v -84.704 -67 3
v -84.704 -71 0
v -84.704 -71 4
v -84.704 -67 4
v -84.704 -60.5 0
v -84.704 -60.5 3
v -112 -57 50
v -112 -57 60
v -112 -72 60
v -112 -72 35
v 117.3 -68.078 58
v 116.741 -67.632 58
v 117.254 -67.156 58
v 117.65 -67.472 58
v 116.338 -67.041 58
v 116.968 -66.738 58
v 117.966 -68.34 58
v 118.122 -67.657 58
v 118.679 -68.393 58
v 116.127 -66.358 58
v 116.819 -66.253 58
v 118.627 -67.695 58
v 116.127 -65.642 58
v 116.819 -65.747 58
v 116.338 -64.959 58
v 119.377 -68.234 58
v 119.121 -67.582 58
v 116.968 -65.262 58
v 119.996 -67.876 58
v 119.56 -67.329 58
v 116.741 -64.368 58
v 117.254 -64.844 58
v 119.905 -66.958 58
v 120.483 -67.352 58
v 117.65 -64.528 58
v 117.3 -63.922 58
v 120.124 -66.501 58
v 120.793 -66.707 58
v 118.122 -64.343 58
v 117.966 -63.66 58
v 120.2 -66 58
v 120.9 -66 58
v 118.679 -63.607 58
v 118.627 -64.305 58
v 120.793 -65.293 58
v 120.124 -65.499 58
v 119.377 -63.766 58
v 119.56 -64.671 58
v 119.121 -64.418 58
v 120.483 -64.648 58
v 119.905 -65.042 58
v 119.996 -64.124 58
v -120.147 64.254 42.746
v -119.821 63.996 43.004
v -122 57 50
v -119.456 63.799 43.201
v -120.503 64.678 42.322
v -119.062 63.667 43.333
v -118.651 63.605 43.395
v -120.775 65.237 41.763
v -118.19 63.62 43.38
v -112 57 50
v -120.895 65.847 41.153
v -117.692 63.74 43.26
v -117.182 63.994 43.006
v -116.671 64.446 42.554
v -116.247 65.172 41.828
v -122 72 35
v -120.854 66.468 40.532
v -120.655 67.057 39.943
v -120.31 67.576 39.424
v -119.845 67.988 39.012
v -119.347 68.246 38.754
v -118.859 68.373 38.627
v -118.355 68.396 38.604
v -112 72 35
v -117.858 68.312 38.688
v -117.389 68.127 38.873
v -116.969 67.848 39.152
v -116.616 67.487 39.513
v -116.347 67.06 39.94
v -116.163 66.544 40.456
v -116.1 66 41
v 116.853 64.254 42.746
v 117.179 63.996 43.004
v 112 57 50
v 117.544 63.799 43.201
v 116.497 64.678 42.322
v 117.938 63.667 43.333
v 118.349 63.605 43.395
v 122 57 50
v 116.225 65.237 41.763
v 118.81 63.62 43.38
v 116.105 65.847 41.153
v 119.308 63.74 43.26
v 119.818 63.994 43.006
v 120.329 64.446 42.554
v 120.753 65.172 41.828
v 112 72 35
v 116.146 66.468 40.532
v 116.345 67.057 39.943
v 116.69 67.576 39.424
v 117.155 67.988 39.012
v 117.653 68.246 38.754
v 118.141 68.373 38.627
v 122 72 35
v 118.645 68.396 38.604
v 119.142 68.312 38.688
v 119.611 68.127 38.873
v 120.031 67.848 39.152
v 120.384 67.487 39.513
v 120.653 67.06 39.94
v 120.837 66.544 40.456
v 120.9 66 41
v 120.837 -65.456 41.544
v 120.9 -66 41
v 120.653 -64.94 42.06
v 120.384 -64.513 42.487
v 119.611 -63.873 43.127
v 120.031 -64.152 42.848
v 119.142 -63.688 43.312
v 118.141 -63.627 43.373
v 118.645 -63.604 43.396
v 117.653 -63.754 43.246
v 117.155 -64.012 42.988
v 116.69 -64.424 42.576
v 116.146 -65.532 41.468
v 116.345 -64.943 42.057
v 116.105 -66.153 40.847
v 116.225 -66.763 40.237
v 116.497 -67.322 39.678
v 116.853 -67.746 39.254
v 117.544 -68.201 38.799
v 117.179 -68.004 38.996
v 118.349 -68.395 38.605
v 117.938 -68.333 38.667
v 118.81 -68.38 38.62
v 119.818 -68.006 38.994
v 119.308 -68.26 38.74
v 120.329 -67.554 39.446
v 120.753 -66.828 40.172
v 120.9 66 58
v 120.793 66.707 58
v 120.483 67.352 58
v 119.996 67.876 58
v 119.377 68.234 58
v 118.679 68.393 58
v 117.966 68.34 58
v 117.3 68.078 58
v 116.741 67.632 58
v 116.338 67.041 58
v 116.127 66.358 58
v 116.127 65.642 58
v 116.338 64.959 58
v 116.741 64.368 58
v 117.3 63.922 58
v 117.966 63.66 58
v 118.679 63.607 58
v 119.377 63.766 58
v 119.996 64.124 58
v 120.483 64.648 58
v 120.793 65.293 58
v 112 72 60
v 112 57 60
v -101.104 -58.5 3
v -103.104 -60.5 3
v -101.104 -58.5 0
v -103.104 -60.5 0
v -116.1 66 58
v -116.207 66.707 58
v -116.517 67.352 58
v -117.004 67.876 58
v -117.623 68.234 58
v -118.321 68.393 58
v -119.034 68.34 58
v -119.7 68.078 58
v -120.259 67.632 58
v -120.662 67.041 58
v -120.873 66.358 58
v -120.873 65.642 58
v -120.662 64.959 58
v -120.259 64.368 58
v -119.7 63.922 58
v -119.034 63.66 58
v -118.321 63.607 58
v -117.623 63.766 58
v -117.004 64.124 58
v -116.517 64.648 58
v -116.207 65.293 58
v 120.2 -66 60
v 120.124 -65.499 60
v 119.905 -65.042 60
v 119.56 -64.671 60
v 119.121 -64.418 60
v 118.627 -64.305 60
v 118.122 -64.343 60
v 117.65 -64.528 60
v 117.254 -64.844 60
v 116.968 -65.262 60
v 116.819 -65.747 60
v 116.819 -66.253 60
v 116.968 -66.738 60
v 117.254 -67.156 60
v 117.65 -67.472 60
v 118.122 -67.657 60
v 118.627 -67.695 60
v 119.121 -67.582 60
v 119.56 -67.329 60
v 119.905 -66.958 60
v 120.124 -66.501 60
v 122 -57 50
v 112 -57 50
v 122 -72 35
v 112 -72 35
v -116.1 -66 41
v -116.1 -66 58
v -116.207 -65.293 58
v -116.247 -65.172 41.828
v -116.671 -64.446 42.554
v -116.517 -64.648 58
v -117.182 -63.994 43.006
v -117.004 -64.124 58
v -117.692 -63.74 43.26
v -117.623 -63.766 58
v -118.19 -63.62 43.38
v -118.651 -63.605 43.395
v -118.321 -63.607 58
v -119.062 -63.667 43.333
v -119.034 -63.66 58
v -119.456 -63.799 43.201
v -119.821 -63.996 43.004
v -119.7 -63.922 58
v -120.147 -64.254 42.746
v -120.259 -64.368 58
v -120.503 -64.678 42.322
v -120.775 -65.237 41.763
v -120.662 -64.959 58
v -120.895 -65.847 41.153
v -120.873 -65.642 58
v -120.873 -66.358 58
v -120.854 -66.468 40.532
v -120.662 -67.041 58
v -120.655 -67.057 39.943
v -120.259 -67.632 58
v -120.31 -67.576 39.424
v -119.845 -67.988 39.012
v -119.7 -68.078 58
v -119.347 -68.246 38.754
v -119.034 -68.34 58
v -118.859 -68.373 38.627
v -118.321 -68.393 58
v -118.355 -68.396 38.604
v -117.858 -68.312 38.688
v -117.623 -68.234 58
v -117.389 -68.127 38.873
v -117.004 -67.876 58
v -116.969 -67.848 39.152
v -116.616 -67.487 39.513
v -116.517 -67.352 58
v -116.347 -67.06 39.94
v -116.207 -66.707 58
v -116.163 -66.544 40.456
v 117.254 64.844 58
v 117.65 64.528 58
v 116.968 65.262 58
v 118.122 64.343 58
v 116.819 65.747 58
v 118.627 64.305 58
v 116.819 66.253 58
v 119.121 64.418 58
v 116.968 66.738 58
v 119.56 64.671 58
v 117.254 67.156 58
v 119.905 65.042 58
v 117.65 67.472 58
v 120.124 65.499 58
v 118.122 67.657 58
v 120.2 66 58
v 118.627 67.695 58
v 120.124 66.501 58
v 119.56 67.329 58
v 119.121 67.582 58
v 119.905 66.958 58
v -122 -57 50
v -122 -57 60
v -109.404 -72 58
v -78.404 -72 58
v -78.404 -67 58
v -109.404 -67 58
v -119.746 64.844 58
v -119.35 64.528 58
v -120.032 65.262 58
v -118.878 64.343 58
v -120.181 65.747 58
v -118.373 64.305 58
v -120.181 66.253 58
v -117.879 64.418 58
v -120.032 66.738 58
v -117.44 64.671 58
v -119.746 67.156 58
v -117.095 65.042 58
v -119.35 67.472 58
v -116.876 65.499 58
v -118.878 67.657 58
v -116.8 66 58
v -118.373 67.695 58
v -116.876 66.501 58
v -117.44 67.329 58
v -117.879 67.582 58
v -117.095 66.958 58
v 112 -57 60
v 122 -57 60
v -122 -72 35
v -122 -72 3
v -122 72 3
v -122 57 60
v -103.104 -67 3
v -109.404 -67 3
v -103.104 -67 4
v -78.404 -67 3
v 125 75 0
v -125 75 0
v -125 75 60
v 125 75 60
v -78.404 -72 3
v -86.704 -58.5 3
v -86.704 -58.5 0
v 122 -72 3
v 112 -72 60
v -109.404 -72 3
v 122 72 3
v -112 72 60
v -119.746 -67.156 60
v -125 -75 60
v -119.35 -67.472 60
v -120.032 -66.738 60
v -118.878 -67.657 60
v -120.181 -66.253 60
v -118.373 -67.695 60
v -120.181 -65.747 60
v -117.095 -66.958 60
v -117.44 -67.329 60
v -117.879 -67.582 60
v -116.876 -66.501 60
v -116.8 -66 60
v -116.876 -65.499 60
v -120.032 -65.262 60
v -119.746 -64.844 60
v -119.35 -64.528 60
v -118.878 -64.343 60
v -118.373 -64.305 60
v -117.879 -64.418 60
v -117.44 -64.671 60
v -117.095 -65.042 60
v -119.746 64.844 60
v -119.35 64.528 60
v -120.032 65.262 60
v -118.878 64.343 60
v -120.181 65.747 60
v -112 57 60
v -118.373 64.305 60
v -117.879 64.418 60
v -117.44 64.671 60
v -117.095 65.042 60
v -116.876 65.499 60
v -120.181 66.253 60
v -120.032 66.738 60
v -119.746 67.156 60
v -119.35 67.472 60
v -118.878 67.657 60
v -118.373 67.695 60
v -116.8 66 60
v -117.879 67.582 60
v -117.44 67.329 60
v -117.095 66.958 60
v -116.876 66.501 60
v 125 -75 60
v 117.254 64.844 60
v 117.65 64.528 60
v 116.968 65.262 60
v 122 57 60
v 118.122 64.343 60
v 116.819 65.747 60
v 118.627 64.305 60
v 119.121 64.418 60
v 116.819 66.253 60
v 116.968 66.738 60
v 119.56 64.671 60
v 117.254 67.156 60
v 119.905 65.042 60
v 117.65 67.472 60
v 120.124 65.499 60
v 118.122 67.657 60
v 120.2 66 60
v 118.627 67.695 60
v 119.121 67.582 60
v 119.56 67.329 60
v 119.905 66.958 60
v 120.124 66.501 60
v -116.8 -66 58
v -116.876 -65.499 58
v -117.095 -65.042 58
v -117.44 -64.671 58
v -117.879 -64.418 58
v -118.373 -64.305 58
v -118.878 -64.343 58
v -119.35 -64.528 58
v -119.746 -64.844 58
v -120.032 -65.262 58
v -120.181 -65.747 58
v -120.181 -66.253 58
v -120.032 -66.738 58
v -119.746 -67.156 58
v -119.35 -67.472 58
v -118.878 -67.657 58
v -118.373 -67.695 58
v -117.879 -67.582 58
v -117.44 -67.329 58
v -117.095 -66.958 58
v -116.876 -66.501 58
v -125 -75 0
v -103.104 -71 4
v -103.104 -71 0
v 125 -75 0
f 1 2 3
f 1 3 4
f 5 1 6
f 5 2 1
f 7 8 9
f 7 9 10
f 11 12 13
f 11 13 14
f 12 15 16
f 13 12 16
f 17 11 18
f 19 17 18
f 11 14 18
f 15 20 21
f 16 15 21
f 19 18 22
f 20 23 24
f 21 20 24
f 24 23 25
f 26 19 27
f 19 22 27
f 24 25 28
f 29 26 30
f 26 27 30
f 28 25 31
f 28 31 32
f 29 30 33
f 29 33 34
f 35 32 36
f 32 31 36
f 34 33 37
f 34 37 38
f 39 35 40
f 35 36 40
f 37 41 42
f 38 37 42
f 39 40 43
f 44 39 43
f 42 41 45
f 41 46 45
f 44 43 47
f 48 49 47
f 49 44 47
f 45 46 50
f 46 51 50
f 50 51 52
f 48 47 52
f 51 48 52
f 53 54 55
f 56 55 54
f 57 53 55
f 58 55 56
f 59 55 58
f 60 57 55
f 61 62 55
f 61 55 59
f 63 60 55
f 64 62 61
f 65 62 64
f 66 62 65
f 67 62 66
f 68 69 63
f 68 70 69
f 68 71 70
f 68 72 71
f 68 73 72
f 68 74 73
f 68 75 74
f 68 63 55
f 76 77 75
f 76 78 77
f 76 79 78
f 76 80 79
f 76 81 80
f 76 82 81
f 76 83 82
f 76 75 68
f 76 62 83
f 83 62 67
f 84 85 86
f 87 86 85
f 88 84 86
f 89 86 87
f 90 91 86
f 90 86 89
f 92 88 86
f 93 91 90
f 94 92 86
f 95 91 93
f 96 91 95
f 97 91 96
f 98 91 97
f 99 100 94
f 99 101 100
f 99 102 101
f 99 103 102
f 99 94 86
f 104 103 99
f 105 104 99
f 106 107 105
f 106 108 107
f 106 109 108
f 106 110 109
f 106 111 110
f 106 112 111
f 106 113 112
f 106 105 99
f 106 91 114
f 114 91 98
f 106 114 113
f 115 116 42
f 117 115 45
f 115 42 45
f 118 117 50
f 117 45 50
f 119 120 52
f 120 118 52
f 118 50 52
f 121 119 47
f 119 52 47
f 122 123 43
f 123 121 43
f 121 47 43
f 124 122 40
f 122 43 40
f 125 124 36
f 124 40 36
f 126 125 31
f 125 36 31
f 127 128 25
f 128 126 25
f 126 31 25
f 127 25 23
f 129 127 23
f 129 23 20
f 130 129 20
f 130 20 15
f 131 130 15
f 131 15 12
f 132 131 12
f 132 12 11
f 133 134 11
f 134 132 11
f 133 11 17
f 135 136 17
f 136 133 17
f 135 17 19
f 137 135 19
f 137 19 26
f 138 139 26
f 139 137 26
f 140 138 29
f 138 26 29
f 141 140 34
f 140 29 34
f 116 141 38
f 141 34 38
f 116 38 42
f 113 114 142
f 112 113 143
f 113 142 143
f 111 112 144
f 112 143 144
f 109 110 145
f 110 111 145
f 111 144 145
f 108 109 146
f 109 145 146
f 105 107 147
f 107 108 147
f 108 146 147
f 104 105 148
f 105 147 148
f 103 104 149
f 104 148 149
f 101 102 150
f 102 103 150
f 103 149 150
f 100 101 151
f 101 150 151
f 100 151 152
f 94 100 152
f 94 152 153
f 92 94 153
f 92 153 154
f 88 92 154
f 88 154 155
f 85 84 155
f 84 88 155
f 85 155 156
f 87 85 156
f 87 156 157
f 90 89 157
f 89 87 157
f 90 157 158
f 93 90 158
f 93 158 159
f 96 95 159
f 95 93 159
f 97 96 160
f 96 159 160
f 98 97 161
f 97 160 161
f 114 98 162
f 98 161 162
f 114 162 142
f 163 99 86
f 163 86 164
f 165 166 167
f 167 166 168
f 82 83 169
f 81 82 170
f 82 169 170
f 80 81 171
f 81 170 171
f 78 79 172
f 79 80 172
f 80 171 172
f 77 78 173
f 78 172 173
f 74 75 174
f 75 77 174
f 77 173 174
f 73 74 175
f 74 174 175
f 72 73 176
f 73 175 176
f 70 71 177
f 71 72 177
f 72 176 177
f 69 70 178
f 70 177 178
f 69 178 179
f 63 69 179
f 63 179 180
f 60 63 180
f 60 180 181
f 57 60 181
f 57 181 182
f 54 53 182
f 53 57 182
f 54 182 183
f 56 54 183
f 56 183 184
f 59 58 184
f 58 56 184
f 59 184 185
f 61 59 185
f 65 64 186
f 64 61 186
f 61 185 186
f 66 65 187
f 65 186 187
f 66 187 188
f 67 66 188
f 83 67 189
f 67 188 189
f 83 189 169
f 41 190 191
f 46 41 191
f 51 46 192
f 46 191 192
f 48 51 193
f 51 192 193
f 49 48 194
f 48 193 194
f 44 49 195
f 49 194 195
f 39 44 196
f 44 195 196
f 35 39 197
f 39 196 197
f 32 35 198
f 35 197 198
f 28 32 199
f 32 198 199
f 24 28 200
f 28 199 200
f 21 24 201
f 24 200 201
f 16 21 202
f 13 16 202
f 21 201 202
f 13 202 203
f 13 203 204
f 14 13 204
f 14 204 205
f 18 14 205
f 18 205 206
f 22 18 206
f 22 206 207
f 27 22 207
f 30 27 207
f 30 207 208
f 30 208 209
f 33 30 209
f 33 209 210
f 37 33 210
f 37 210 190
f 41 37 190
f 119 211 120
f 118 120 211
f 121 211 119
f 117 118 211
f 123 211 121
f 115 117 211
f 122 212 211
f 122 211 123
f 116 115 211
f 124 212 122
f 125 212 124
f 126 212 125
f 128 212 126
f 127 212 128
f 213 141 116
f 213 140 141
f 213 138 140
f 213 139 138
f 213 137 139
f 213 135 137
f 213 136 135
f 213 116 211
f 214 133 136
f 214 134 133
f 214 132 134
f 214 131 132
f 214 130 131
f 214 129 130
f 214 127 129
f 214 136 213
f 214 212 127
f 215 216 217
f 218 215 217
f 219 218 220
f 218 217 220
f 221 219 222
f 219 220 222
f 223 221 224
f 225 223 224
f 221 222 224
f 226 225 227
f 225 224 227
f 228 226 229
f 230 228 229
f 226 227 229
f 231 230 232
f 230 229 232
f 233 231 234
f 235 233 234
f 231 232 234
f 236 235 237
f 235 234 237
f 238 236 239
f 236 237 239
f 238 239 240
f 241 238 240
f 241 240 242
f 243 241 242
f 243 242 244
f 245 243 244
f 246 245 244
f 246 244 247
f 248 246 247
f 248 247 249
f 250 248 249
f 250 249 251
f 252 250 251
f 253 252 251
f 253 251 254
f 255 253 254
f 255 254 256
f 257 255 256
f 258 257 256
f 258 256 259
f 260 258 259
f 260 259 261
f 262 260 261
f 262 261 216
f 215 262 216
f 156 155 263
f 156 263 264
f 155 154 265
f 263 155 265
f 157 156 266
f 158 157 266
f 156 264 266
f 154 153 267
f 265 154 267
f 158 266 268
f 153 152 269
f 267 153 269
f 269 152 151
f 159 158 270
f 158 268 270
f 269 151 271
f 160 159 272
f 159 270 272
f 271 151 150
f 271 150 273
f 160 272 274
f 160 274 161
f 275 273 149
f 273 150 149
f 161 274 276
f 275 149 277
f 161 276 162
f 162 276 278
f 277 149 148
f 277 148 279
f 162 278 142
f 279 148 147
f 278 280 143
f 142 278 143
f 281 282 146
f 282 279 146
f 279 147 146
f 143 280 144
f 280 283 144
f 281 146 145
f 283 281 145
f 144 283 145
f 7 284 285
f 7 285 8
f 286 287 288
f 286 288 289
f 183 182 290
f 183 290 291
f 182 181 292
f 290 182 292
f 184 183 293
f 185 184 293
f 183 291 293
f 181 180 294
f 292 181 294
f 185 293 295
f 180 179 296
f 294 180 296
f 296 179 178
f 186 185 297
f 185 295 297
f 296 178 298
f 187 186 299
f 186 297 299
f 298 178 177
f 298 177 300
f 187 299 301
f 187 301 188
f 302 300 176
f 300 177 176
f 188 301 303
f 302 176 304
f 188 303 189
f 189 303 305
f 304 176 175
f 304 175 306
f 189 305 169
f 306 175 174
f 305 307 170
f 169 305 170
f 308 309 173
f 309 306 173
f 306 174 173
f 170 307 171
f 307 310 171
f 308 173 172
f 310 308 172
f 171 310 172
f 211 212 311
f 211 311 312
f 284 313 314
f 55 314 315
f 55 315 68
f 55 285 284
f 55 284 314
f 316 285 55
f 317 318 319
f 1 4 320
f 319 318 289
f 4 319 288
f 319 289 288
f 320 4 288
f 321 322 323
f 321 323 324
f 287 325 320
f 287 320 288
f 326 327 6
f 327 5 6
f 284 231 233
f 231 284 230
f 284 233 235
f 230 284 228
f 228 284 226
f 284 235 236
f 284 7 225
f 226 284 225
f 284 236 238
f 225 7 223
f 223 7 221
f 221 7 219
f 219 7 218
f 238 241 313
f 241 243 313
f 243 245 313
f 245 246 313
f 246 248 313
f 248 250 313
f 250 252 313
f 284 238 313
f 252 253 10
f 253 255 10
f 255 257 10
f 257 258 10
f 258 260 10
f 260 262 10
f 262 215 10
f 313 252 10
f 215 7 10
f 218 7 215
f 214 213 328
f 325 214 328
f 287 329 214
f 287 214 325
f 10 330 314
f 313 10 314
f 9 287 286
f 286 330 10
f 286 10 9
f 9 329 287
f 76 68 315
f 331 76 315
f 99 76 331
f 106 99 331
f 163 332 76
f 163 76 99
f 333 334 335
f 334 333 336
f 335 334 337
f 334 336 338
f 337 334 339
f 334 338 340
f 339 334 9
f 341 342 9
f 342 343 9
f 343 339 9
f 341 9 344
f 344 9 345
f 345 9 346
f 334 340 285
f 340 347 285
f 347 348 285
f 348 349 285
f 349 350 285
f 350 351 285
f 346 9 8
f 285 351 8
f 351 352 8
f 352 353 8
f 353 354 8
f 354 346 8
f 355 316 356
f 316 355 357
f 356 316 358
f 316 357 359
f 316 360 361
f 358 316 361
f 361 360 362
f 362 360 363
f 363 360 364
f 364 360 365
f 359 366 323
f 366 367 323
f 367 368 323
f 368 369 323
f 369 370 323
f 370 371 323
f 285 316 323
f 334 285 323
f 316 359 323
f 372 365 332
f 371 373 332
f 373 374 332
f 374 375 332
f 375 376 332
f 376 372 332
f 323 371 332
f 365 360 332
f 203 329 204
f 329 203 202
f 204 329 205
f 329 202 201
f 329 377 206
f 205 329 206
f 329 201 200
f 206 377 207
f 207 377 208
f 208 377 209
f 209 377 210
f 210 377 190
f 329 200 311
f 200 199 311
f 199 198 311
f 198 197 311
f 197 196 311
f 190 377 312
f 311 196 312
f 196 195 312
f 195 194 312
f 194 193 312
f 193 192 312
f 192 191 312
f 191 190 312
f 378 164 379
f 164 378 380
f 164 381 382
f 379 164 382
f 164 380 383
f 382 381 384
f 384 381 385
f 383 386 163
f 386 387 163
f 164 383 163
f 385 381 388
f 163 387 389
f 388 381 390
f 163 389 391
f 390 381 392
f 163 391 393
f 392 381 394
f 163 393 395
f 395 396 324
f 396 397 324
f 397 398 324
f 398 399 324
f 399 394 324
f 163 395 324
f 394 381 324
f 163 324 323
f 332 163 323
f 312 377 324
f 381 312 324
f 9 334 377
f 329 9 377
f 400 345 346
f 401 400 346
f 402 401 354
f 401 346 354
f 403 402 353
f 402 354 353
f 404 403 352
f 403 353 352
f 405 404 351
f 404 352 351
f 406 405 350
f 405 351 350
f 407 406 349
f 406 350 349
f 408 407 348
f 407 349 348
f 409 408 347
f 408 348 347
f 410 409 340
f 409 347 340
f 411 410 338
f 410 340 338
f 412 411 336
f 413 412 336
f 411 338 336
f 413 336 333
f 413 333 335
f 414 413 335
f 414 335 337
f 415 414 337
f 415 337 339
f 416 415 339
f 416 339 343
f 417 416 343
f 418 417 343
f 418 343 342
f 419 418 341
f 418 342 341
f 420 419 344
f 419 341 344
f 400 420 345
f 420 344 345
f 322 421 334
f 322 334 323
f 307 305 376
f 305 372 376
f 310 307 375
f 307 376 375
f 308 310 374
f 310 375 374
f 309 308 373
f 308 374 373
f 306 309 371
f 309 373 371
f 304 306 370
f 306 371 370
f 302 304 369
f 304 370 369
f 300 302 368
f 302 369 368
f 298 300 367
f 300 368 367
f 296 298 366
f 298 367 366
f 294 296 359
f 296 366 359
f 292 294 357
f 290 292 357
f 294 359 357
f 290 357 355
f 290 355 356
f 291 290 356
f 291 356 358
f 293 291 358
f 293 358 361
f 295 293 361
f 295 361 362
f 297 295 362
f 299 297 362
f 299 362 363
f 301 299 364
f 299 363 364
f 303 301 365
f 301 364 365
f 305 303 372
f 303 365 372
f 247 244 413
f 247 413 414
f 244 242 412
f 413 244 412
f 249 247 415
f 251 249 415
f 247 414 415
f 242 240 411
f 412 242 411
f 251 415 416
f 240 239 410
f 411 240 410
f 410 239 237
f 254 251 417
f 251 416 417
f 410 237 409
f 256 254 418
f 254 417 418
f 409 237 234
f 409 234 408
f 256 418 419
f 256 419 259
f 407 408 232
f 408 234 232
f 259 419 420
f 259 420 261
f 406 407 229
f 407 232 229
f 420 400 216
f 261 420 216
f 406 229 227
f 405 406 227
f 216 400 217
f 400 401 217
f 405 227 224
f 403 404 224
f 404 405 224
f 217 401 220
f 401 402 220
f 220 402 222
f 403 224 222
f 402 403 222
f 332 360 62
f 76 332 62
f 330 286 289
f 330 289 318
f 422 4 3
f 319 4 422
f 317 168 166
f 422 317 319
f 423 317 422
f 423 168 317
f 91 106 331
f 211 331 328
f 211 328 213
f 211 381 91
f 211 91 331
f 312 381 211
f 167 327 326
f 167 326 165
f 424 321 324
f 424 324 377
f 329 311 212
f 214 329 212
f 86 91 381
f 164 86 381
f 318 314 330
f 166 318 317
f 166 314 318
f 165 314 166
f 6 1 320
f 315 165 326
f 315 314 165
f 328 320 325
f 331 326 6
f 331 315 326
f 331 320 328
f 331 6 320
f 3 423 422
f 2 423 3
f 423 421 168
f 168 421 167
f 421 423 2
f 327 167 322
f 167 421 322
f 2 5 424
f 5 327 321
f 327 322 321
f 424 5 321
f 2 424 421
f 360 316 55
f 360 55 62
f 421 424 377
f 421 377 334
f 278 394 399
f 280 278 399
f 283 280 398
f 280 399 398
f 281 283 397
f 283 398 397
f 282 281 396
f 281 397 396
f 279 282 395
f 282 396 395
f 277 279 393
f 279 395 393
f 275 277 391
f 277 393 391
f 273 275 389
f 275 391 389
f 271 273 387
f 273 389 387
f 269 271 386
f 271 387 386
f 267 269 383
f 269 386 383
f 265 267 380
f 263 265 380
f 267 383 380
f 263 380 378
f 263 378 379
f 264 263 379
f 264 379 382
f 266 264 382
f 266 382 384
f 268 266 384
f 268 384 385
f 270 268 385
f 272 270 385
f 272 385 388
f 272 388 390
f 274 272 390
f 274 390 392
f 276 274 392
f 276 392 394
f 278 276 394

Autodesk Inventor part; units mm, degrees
ref_plane "YZ Plane" through (0, 0, 0) normal (1, 0, 0) x (0, 1, 0)
ref_plane "XZ Plane" through (0, 0, 0) normal (0, 1, 0) x (-1, 0, 0)
ref_plane "XY Plane" through (0, 0, 0) normal (0, 0, 1) x (1, 0, 0)
sketch "Sketch7" plane through (0, 0, 0) normal (0, 0, 1) x (1, 0, 0)
  line L0 (125, -75) -> (-125, -75)
  line L1 (-125, -75) -> (-125, 75)
  line L2 (-125, 75) -> (125, 75)
  line L3 (125, 75) -> (125, -75)
  line L4 (125, -75) -> (-125, 75) construction
  line L5 (-125, -75) -> (125, 75) construction
  point P0 (0, 0)
  dimension "d15" = 250
  dimension "d16" = 150
extrude "Box Outside" add sketch "Sketch7" along normal blind 60
sketch "Sketch8" plane through (0, 0, 60) normal (0, 0, 1) x (1, 0, 0)
  line L0 (-122, 72) -> (122, 72)
  line L1 (122, 72) -> (122, -72)
  line L2 (122, -72) -> (-122, -72)
  line L3 (-122, -72) -> (-122, 72)
  line L4 (125, 75) -> (-125, 75) projected
  line L5 (-125, 75) -> (-125, -75) projected
  line L6 (-125, -75) -> (125, -75) projected
  line L7 (125, -75) -> (125, 75) projected
  point P0 (0, 0)
  dimension "d19" = 3
  dimension "d20" = 3
  dimension "d21" = 3
  dimension "d22" = 3
extrude "Box Cut" cut sketch "Sketch8" against normal blind 57 contours L0 L1 L2 L3
sketch "Sketch9" plane through (-122, -72, 60) normal (0, 1, 0) x (1, 0, 0)
  line L0 (0, 0) -> (10, 0)
  line L1 (10, 0) -> (10, 25)
  line L2 (10, 25) -> (0, 25)
  line L3 (0, 25) -> (0, 0)
  point P0 (122, 60)
  dimension "d25" = 10
  dimension "d26" = 25
extrude "ScrewHole Box LB" add sketch "Sketch9" along normal blind 15
sketch "Sketch10" plane through (-122, -72, 3) normal (0, 1, 0) x (1, 0, 0)
  line L0 (244, -57) -> (244, 0) projected
  line L1 (244, -57) -> (234, -57)
  line L2 (234, -57) -> (234, -32)
  line L3 (234, -32) -> (244, -32)
  line L4 (244, -32) -> (244, -57)
  point P0 (122, 3)
  dimension "d29" = 10
  dimension "d30" = 25
extrude "ScrewHole Box RB" add sketch "Sketch10" along normal blind 15
sketch "Sketch11" plane through (-122, 72, 60) normal (0, -1, 0) x (1, 0, 0)
  line L0 (0, 0) -> (244, 0) projected
  line L1 (0, 0) -> (10, 0)
  line L2 (10, 0) -> (10, -25)
  line L3 (10, -25) -> (0, -25)
  line L4 (0, -25) -> (0, 0)
  point P0 (122, -60)
  dimension "d33" = 10
  dimension "d34" = 25
extrude "ScrewHole Box LU" add sketch "Sketch11" along normal blind 15
sketch "Sketch13" plane through (122, -72, 3) normal (-1, 0, 0) x (0, 0, 1)
  line L0 (57, 144) -> (0, 144) projected
  line L1 (57, 144) -> (32, 144)
  line L2 (32, 144) -> (32, 129)
  line L3 (32, 129) -> (57, 129)
  line L4 (57, 129) -> (57, 144)
  point P0 (-3, 72)
  dimension "d37" = 25
  dimension "d38" = 15
extrude "ScrewHole Box RU" add sketch "Sketch13" along normal blind 10
sketch "Sketch27" plane through (0, 0, 60) normal (0, 0, 1) x (1, 0, 0)
  line L0 (-112, -72) -> (-112, -57) projected
  line L1 (-125, 75) -> (-125, -75) projected
  line L2 (-112, -57) -> (-125, -57)
  line L3 (-125, -57) -> (-125, -75)
  line L4 (-125, -75) -> (-112, -75)
  line L5 (-112, -75) -> (-112, -57)
  line L6 (-112, -57) -> (-125, -75)
  line L7 (-112, -75) -> (-125, -57)
  circle A0 centre (-118.5, -66) radius 2.4
  point P0 (0, 0)
  dimension "d84" = 4.8
extrude "Outside ScrewHole LB" cut sketch "Sketch27" against normal blind 26 contours A0 L7 L6 | L6 L7 A0 | A0 L6 L7 | L7 L6 A0
sketch "Sketch29" plane through (0, 0, 60) normal (0, 0, 1) x (1, 0, 0)
  line L0 (-112, -72) -> (-112, -57) projected
  line L1 (-125, -75) -> (125, -75) projected
  line L2 (-112, -57) -> (-125, -57)
  line L3 (-125, -57) -> (-125, -75)
  line L4 (-125, -75) -> (-112, -75)
  line L5 (-112, -75) -> (-112, -57)
  line L6 (-112, -57) -> (-125, -75)
  circle A0 centre (-118.5, -66) radius 2.4
  point P0 (0, 0)
extrude "ScrewRibbon LB" add sketch "Sketch29" against normal blind 2 contours A0 L6 | L6 A0
sketch "Sketch30" plane through (0, 0, 60) normal (0, 0, 1) x (1, 0, 0)
  line L0 (-122, -57) -> (-112, -57) projected
  line L1 (-125, -75) -> (125, -75) projected
  line L2 (-112, -57) -> (-125, -57)
  line L3 (-125, -57) -> (-125, -75)
  line L4 (-125, -75) -> (-112, -75)
  line L5 (-112, -75) -> (-112, -57)
  line L6 (-112, -57) -> (-125, -75)
  circle A0 centre (-118.5, -66) radius 1.7
  point P0 (0, 0)
  dimension "d92" = 3.4
extrude "Inside ScrewHole LB" cut sketch "Sketch30" against normal blind 24 contours A0 L6 | L6 A0
sketch "Sketch31" plane through (0, 0, 60) normal (0, 0, 1) x (1, 0, 0)
  line L0 (-125, 75) -> (-125, -75) projected
  line L1 (-112, 57) -> (-122, 57) projected
  line L2 (-125, 75) -> (-112, 75)
  line L3 (-112, 75) -> (-112, 57)
  line L4 (-112, 57) -> (-125, 57)
  line L5 (-125, 57) -> (-125, 75)
  line L6 (-125, 75) -> (-112, 57)
  circle A0 centre (-118.5, 66) radius 2.4
  point P0 (0, 0)
  dimension "d95" = 4.8
extrude "Outside ScrewHole LU" cut sketch "Sketch31" against normal blind 24 contours A0 L6 | L6 A0
sketch "Sketch32" plane through (0, 0, 60) normal (0, 0, 1) x (1, 0, 0)
  line L0 (-122, 57) -> (-112, 57) projected
  line L1 (-125, 75) -> (-125, -75) projected
  line L2 (-112, 57) -> (-125, 57)
  line L3 (-125, 57) -> (-125, 75)
  line L4 (-125, 75) -> (-112, 75)
  line L5 (-112, 75) -> (-112, 57)
  line L6 (-112, 75) -> (-125, 57)
  circle A0 centre (-118.5, 66) radius 2.4
  point P0 (0, 0)
  dimension "d98" = 4.8
extrude "ScrewRibbon LU" add sketch "Sketch32" against normal blind 2 contours A0 L6 | L6 A0
sketch "Sketch33" plane through (0, 0, 60) normal (0, 0, 1) x (1, 0, 0)
  line L0 (125, 75) -> (-125, 75) projected
  line L1 (-112, 57) -> (-122, 57) projected
  line L2 (-125, 75) -> (-112, 75)
  line L3 (-112, 75) -> (-112, 57)
  line L4 (-112, 57) -> (-125, 57)
  line L5 (-125, 57) -> (-125, 75)
  line L6 (-125, 75) -> (-112, 57)
  circle A0 centre (-118.5, 66) radius 1.7
  point P0 (0, 0)
  dimension "d101" = 3.4
extrude "Inside ScrewHole LU" cut sketch "Sketch33" against normal blind 21.75 contours A0 L6 | L6 A0
sketch "Sketch34" plane through (0, 0, 60) normal (0, 0, 1) x (1, 0, 0)
  line L0 (112, 57) -> (112, 72) projected
  line L1 (125, 75) -> (-125, 75) projected
  line L2 (112, 57) -> (125, 57)
  line L3 (125, 57) -> (125, 75)
  line L4 (125, 75) -> (112, 75)
  line L5 (112, 75) -> (112, 57)
  line L6 (125, 75) -> (112, 57)
  circle A0 centre (118.5, 66) radius 2.4
  point P0 (0, 0)
  dimension "d104" = 4.8
extrude "Outside ScrewHole RU" cut sketch "Sketch34" against normal blind 37 contours A0 L6 | L6 A0
sketch "Sketch35" plane through (0, 0, 60) normal (0, 0, 1) x (1, 0, 0)
  line L0 (125, -75) -> (125, 75) projected
  line L1 (122, 57) -> (112, 57) projected
  line L2 (125, 75) -> (112, 75)
  line L3 (112, 75) -> (112, 57)
  line L4 (112, 57) -> (125, 57)
  line L5 (125, 57) -> (125, 75)
  line L6 (125, 75) -> (-125, 75) projected
  line L7 (125, 75) -> (112, 57)
  circle A0 centre (118.5, 66) radius 2.4
  point P0 (0, 0)
  dimension "d107" = 4.8
extrude "ScrewRibbon RU" add sketch "Sketch35" against normal blind 2 contours A0 L7 | L7 A0
sketch "Sketch36" plane through (0, 0, 60) normal (0, 0, 1) x (1, 0, 0)
  line L0 (122, 57) -> (112, 57) projected
  line L1 (125, -75) -> (125, 75) projected
  line L2 (112, 57) -> (125, 57)
  line L3 (125, 57) -> (125, 75)
  line L4 (125, 75) -> (112, 75)
  line L5 (112, 75) -> (112, 57)
  line L6 (112, 57) -> (125, 75)
  circle A0 centre (118.5, 66) radius 2.4 projected
  circle A1 centre (118.5, 66) radius 1.7
  point P0 (0, 0)
  dimension "d110" = 3.4
extrude "Inside ScrewHole RU" cut sketch "Sketch36" against normal blind 20 contours A1 L6 | L6 A1
sketch "Sketch37" plane through (0, 0, 60) normal (0, 0, 1) x (1, 0, 0)
  line L0 (125, -75) -> (125, 75) projected
  line L1 (112, -72) -> (112, -57) projected
  line L2 (125, -75) -> (112, -75)
  line L3 (112, -75) -> (112, -57)
  line L4 (112, -57) -> (125, -57)
  line L5 (125, -57) -> (125, -75)
  line L6 (112, -75) -> (125, -57)
  circle A0 centre (118.5, -66) radius 2.4
  point P0 (0, 0)
  dimension "d113" = 4.8
extrude "Outside ScrewHole RB" cut sketch "Sketch37" against normal blind 27.5 contours A0 L6 | L6 A0
sketch "Sketch38" plane through (0, 0, 60) normal (0, 0, 1) x (1, 0, 0)
  line L0 (122, -57) -> (112, -57) projected
  line L1 (125, -75) -> (125, 75) projected
  line L2 (112, -57) -> (125, -57)
  line L3 (125, -57) -> (125, -75)
  line L4 (125, -75) -> (112, -75)
  line L5 (112, -75) -> (112, -57)
  line L6 (125, -57) -> (112, -75)
  circle A0 centre (118.5, -66) radius 2.4
  point P0 (0, 0)
  dimension "d116" = 4.8
extrude "ScrewRibbon RB" add sketch "Sketch38" against normal blind 2 contours A0 L6 | L6 A0
sketch "Sketch39" plane through (0, 0, 60) normal (0, 0, 1) x (1, 0, 0)
  line L0 (112, -72) -> (112, -57) projected
  line L1 (125, -75) -> (125, 75) projected
  line L2 (112, -57) -> (125, -57)
  line L3 (125, -57) -> (125, -75)
  line L4 (125, -75) -> (112, -75)
  line L5 (112, -75) -> (112, -57)
  line L6 (112, -75) -> (125, -57)
  circle A0 centre (118.5, -66) radius 2.4 projected
  circle A1 centre (118.5, -66) radius 1.7
  point P0 (0, 0)
  dimension "d119" = 3.4
extrude "Inside ScrewHole RB" cut sketch "Sketch39" against normal blind 20 contours A1 L6 | L6 A1
sketch "Sketch42" plane through (-122, -72, 3) normal (0, 1, 0) x (1, 0, 0)
  line L0 (244, 0) -> (0, 0) projected
  line L1 (12.5963, 0) -> (43.5963, 0)
  line L2 (43.5963, 0) -> (43.5963, -55)
  line L3 (43.5963, -55) -> (12.5963, -55)
  line L4 (12.5963, -55) -> (12.5963, 0)
  point P0 (122, 3)
  point P1 (43.5963, 0)
  dimension "d134" = 31
  dimension "d135" = 55
extrude "ESPHolder" add sketch "Sketch42" along normal blind 5
sketch "Sketch43" plane through (0, 0, 3) normal (0, 0, 1) x (1, 0, 0)
  line L0 (-109.4037, -67) -> (-78.4037, -67) projected
  line L1 (-99.1037, -67) -> (-88.7037, -67)
  line L2 (-88.7037, -67) -> (-88.7037, -62.5)
  line L3 (-88.7037, -62.5) -> (-99.1037, -62.5)
  line L4 (-99.1037, -62.5) -> (-99.1037, -67)
  line L5 (-78.4037, -67) -> (-109.4037, -67)
  line L6 (-109.4037, -67) -> (-109.4037, -51.7804)
  line L7 (-109.4037, -51.7804) -> (-78.4037, -51.7804)
  line L8 (-78.4037, -51.7804) -> (-78.4037, -67)
  point P0 (0, 0)
  dimension "d138" = 10.3
  dimension "d139" = 10.3
  dimension "d140" = 4.5
extrude "PortHole" cut sketch "Sketch43" against normal through all contours L4 L3 L2 L0
sketch "Sketch44" plane through (0, 0, 0) normal (0, 0, -1) x (-1, 0, 0)
  line L0 (84.7037, -58.5) -> (103.1037, -58.5)
  line L1 (103.1037, -58.5) -> (103.1037, -71)
  line L2 (103.1037, -71) -> (84.7037, -71)
  line L3 (84.7037, -71) -> (84.7037, -58.5)
  line L4 (88.7037, -62.5) -> (99.1037, -62.5) projected
  line L5 (99.1037, -67) -> (88.7037, -67) projected
  line L6 (99.1037, -62.5) -> (99.1037, -67) projected
  line L7 (88.7037, -67) -> (88.7037, -62.5) projected
  point P0 (0, 0)
  dimension "d143" = 4
  dimension "d144" = 4
  dimension "d145" = 4
  dimension "d146" = 4
extrude "Extrusion29" cut sketch "Sketch44" against normal blind 4
chamfer "Chamfer1" distance 15 angle 45 1 edges at (-117, -57, 35)
chamfer "Chamfer2" distance 15 angle 45 1 edges at (-117, 57, 35)
chamfer "Chamfer3" distance 15 angle 45 1 edges at (117, 57, 35)
chamfer "Chamfer4" distance 15 angle 45 1 edges at (117, -57, 35)
chamfer "Chamfer5" distance 2 angle 45 2 edges at (-84.7037, -58.5, 1.5) (-103.1037, -58.5, 1.5)
properties part number "Box2"
